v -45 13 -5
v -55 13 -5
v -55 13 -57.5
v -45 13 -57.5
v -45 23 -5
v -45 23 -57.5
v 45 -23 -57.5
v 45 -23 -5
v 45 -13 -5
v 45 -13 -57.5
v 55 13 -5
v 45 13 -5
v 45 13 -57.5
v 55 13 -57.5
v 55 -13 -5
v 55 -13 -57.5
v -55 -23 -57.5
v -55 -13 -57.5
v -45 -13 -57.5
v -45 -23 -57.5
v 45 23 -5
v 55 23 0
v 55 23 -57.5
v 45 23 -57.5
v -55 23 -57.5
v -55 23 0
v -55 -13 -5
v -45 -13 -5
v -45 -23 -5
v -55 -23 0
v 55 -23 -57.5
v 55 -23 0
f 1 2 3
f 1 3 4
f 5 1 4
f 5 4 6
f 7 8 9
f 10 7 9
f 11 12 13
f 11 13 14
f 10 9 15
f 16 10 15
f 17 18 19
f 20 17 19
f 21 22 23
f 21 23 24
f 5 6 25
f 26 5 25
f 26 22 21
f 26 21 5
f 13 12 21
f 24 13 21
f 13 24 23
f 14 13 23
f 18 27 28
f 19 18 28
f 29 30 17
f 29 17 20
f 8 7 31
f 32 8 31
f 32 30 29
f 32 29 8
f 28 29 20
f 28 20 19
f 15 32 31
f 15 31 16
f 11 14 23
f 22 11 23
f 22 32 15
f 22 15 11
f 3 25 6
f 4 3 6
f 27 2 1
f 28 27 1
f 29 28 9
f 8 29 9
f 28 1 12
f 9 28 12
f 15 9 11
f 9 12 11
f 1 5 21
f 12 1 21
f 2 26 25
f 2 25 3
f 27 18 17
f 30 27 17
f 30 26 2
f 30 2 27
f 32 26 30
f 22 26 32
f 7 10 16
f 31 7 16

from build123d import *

# Parameters (mm, degrees)
F0_W     = 90
F0_H     = 10
F0_W_2   = 10
F0_H_2   = 26
F1_DEPTH = 5
F2_DEPTH = 5
F3_DEPTH = 57.5


with BuildPart() as f1:
    # F0 (on Top) → F1 (new body)
    with BuildSketch(Plane.XY):
        with Locations((0, 18)):
            Rectangle(F0_W, F0_H)
        with Locations((-50, 0)):
            Rectangle(F0_W_2, F0_H_2)
        with Locations((-50, 18)):
            Rectangle(F0_W_2, F0_H)
        with Locations((50, 0)):
            Rectangle(F0_W_2, F0_H_2)
        with Locations((50, 18)):
            Rectangle(F0_W_2, F0_H)
        with Locations((-50, -18)):
            Rectangle(F0_W_2, F0_H)
        with Locations((0, -18)):
            Rectangle(F0_W, F0_H)
        with Locations((50, -18)):
            Rectangle(F0_W_2, F0_H)
    extrude(amount=-F1_DEPTH)

    # F0 (on Top) → F2 (join)
    with BuildSketch(Plane.XY):
        Rectangle(F0_W, F0_H_2)
    extrude(amount=-F2_DEPTH)

    # F0 (on Top) → F3 (join)
    with BuildSketch(Plane.XY):
        with Locations((-50, 18)):
            Rectangle(F0_W_2, F0_H)
        with Locations((50, 18)):
            Rectangle(F0_W_2, F0_H)
        with Locations((50, -18)):
            Rectangle(F0_W_2, F0_H)
        with Locations((-50, -18)):
            Rectangle(F0_W_2, F0_H)
    extrude(amount=-F3_DEPTH)


solid = f1.part
